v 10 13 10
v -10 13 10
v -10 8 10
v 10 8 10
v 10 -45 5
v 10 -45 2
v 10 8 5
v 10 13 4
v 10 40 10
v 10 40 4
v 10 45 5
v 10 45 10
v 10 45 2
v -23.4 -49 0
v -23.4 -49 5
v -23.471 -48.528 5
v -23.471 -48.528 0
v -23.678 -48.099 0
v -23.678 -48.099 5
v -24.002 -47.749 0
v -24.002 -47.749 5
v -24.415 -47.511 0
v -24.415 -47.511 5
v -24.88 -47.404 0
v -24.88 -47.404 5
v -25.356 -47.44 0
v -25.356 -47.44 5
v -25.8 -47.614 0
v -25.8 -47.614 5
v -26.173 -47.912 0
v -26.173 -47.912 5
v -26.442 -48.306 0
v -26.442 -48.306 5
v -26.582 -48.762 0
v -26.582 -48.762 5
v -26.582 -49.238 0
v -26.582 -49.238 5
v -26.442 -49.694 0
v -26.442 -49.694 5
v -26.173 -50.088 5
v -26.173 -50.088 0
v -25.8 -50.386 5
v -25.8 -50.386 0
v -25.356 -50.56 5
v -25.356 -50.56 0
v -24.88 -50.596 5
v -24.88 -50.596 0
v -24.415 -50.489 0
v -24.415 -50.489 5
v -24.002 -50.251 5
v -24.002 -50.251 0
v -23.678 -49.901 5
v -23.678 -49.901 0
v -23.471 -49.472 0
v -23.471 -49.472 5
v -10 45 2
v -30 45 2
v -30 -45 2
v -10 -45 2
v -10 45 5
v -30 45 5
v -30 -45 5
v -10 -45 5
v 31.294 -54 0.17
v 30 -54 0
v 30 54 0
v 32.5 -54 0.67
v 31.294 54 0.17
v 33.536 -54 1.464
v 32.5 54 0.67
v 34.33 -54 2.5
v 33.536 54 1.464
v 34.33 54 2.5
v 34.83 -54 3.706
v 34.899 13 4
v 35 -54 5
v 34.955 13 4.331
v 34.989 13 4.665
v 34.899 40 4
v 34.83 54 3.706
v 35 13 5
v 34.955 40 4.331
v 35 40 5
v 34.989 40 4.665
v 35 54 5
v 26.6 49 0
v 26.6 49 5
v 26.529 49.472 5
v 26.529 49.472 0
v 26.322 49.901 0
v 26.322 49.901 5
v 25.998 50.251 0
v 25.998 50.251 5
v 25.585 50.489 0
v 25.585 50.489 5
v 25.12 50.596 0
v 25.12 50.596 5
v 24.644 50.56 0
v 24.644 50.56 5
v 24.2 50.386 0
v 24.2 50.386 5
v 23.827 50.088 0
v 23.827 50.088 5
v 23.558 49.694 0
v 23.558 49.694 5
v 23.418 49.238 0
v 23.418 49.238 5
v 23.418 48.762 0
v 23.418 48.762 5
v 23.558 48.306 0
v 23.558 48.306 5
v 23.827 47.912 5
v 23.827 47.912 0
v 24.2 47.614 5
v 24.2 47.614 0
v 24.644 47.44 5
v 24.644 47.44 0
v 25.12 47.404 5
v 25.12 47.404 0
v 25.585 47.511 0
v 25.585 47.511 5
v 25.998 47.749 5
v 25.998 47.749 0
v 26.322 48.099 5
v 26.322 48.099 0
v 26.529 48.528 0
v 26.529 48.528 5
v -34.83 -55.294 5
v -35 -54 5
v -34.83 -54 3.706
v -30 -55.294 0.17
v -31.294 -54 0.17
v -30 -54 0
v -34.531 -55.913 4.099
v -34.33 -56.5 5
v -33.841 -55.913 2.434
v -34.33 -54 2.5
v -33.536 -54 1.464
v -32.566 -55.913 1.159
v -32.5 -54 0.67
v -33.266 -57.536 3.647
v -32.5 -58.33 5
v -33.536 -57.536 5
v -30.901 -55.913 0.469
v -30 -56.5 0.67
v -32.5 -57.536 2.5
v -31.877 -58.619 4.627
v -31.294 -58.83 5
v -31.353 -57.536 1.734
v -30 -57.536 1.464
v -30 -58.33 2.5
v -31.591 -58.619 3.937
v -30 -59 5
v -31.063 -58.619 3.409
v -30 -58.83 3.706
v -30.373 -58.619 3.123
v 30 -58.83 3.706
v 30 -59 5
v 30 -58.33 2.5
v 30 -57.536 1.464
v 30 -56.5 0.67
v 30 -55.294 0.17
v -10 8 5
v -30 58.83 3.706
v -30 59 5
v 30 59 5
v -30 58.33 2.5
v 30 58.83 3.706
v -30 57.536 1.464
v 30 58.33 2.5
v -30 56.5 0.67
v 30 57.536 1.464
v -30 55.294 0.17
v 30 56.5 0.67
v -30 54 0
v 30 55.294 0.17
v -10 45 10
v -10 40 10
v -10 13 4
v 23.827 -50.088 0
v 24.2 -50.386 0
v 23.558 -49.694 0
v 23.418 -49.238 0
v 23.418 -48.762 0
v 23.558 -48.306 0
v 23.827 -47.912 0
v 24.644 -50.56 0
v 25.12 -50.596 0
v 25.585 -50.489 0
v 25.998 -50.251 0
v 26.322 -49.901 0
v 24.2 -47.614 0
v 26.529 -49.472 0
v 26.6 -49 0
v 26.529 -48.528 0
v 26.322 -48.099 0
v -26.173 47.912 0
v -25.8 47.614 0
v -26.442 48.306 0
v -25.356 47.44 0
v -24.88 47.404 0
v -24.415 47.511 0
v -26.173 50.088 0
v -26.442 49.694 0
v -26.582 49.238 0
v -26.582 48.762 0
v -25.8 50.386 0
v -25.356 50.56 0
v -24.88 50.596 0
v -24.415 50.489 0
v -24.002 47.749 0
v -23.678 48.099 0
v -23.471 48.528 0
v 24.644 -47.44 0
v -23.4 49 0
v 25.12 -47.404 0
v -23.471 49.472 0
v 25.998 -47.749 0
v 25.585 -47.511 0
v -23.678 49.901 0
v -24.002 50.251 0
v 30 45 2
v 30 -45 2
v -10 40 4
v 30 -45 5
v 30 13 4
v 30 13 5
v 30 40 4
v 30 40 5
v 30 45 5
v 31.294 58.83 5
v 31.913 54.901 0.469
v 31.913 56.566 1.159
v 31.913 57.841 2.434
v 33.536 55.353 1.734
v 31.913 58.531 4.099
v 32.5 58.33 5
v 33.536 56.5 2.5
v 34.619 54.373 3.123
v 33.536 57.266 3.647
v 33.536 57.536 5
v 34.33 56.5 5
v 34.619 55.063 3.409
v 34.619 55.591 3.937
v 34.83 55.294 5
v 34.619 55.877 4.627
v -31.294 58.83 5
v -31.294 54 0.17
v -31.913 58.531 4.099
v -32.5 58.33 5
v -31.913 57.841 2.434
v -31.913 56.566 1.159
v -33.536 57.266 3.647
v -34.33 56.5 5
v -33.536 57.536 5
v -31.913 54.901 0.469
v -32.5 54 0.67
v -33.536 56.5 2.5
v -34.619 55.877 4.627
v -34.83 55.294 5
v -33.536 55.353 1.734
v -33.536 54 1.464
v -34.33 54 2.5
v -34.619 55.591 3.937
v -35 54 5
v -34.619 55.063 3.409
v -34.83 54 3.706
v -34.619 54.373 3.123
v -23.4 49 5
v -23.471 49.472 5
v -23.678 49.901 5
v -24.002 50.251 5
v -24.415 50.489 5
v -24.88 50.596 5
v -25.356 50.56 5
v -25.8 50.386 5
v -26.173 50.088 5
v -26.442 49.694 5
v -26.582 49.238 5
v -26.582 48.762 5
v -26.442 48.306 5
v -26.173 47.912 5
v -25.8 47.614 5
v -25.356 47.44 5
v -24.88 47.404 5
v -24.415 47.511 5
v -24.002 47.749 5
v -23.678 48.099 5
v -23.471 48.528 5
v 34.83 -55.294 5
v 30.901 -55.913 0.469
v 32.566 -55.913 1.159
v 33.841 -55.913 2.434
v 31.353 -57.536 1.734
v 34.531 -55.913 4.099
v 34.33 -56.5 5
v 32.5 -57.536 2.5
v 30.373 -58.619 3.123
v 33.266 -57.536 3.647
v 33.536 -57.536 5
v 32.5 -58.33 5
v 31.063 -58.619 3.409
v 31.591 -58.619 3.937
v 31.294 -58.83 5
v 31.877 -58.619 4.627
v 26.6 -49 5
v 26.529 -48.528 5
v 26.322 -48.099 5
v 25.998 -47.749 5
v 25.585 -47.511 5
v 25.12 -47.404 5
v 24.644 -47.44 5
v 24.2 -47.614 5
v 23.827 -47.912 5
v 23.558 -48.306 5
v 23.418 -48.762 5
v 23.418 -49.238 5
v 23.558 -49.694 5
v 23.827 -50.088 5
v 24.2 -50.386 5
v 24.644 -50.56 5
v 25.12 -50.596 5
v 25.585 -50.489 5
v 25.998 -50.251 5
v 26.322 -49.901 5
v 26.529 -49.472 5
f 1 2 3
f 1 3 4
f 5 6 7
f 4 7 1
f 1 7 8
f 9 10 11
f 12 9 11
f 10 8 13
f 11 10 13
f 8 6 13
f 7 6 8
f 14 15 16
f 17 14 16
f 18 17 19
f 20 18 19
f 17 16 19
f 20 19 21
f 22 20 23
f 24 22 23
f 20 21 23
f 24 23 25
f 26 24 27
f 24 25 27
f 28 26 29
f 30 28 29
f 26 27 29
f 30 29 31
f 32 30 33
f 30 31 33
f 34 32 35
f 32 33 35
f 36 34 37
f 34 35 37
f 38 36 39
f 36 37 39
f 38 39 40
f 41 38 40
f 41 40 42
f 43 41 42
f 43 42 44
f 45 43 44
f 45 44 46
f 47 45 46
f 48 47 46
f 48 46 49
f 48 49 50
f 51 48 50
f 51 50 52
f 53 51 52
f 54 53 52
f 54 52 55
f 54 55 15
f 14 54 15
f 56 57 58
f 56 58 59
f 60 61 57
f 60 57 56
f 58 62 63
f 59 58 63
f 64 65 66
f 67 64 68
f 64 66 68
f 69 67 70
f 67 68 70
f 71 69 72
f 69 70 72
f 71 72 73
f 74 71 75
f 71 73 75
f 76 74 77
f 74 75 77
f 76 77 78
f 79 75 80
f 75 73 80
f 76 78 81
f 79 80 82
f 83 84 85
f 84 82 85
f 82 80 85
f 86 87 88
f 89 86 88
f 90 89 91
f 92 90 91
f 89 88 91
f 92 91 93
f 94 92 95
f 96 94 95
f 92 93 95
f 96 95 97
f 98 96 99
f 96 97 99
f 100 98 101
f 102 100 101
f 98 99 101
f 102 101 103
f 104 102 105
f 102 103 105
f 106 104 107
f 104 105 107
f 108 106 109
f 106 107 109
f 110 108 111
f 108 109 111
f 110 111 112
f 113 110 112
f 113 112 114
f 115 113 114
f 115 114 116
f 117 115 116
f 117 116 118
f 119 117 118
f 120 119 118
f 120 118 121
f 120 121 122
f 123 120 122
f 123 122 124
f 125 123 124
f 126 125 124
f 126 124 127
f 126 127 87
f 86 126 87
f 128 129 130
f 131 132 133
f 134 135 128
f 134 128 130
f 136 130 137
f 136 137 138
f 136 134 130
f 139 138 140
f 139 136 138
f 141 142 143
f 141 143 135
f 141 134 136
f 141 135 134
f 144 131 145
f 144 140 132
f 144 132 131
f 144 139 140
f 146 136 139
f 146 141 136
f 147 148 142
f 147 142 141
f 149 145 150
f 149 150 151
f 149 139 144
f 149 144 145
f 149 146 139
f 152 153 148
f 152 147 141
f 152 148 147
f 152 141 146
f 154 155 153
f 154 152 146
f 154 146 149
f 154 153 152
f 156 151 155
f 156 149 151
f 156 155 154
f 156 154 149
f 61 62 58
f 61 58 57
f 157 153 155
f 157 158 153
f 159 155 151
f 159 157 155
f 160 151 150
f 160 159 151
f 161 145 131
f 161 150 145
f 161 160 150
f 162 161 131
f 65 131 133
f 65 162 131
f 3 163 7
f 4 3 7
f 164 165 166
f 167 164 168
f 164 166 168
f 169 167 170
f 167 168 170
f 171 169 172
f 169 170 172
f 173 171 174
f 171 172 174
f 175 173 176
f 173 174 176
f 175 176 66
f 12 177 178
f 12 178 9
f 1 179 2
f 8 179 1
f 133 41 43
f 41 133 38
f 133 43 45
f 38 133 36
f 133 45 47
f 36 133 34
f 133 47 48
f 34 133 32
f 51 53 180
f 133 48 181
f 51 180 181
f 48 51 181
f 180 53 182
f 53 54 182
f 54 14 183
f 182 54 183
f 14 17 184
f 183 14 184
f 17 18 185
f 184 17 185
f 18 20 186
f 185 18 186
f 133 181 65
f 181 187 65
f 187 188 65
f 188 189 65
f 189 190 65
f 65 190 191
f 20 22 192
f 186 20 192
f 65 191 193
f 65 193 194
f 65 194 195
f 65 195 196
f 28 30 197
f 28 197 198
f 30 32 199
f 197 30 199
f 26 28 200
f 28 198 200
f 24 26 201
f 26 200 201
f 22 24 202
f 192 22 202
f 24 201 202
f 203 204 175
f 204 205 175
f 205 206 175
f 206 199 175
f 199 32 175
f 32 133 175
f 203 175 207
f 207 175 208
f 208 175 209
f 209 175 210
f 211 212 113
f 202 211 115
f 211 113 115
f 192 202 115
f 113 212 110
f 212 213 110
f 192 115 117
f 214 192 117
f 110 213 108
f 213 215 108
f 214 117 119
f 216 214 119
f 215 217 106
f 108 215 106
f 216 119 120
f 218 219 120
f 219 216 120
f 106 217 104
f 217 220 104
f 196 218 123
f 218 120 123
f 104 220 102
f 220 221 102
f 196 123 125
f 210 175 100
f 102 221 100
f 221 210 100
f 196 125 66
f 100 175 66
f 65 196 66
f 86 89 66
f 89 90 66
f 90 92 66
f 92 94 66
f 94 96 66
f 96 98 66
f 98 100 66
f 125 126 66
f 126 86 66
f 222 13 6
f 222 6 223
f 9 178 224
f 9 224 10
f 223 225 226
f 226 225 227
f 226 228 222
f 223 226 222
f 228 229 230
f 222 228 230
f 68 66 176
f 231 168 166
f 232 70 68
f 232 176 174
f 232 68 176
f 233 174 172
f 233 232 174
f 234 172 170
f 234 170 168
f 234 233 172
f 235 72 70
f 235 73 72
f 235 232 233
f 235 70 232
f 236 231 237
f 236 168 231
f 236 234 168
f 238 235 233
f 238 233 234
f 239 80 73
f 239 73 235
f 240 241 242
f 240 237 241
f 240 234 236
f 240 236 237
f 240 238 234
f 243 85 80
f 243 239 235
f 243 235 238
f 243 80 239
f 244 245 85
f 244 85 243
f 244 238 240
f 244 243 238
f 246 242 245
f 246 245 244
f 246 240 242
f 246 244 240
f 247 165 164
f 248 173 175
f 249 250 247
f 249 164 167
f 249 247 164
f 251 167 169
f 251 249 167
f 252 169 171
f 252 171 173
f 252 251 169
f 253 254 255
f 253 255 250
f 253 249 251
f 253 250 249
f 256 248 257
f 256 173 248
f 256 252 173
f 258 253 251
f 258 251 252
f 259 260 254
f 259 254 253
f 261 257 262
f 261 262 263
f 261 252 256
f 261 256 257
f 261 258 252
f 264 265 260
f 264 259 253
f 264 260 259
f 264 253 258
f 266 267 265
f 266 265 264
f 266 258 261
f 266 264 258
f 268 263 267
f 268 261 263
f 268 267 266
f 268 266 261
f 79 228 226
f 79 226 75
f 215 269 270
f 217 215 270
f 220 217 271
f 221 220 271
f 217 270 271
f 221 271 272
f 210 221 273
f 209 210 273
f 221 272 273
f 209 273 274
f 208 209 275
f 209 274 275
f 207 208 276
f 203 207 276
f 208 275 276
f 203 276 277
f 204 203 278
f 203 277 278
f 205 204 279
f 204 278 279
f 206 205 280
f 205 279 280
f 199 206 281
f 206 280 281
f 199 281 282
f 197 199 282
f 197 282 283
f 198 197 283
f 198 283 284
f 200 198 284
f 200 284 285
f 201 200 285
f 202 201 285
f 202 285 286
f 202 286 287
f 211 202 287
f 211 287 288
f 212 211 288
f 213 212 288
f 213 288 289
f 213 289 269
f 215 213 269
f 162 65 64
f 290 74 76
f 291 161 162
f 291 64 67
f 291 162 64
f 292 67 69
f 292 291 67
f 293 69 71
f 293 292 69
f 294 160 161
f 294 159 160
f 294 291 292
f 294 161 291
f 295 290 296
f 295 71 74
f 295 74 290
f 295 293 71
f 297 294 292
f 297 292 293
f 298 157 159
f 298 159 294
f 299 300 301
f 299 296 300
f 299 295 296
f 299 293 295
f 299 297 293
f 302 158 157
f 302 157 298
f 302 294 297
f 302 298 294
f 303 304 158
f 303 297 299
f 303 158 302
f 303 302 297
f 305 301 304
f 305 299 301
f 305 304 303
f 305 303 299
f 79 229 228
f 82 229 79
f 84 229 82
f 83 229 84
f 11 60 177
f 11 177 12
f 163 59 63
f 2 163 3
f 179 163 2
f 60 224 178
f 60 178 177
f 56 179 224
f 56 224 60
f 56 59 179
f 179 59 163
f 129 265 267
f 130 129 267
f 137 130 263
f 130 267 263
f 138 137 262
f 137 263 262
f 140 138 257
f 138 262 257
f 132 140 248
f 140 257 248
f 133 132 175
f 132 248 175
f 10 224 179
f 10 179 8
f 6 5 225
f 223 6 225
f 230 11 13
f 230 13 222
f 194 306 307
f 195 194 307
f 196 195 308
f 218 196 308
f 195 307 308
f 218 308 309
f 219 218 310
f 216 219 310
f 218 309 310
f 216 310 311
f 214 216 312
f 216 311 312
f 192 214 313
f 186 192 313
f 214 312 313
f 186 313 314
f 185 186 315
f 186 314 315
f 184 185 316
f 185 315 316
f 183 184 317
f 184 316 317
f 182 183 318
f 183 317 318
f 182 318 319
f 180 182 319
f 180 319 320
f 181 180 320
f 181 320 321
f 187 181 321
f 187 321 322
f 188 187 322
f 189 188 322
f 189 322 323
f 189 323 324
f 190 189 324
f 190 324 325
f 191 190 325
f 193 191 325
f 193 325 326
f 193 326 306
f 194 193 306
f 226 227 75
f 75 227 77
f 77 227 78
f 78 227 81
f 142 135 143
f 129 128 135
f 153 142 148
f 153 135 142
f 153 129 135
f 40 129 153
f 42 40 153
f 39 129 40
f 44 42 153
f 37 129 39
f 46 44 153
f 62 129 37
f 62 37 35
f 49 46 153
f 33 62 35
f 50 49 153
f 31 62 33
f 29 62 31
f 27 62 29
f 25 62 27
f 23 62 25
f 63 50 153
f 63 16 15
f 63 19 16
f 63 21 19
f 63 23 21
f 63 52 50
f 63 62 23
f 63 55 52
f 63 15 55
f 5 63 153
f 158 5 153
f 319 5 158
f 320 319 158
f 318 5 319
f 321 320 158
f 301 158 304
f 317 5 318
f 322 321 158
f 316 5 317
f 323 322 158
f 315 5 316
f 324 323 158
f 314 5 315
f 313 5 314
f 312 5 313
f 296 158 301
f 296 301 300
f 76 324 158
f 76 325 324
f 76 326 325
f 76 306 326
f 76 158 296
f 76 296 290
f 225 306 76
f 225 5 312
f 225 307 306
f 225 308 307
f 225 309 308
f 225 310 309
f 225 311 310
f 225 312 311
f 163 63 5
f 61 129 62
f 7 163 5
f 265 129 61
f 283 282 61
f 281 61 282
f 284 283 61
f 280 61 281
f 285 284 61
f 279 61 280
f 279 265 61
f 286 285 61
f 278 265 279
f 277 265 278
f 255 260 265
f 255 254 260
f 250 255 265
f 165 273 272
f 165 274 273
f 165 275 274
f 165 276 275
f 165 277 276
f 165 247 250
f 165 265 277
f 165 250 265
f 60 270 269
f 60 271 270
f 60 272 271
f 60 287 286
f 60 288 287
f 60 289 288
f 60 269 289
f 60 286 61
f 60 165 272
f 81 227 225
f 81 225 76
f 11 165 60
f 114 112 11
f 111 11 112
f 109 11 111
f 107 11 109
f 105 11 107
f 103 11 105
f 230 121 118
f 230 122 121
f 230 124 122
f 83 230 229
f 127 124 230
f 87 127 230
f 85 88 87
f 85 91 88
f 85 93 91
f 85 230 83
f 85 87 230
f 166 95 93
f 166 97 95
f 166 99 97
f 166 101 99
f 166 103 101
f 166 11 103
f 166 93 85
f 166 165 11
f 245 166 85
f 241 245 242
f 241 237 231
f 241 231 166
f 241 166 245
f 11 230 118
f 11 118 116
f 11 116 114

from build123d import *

# Parameters (mm, degrees)
SKETCH_1_W          = 70
SKETCH_1_H          = 118
EXTRUDE_1_DEPTH     = 40
SKETCH_2_W          = 64
SKETCH_2_H          = 112
CUT_EXTRUDE_1_DEPTH = 35
SKETCH_3_R          = 1.6
CUT_EXTRUDE_2_DEPTH = 78.012985918
FILLET_1_R          = 5
FILLET_2_R          = 5
SKETCH_4_W          = 80
SKETCH_4_H          = 120
CUT_EXTRUDE_3_DEPTH = 35
SKETCH_5_W          = 60
SKETCH_5_H          = 27
CUT_EXTRUDE_4_DEPTH = 1
SKETCH_6_W          = 20
SKETCH_6_H          = 90
CUT_EXTRUDE_5_DEPTH = 3
SKETCH_7_W          = 20
SKETCH_7_H          = 90
CUT_EXTRUDE_6_DEPTH = 3
SKETCH_8_W          = 20
SKETCH_8_H          = 5
EXTRUDE_2_DEPTH     = 5


with BuildPart() as part:
    # ｽｹｯﾁ1 → ﾎﾞｽ - 押し出し1 (new body)
    with BuildSketch(Plane.XY):
        Rectangle(SKETCH_1_W, SKETCH_1_H)
    extrude(amount=EXTRUDE_1_DEPTH)

    # ｽｹｯﾁ2 → ｶｯﾄ - 押し出し1 (cut)
    with BuildSketch(Plane.XY.offset(40)):
        Rectangle(SKETCH_2_W, SKETCH_2_H)
    extrude(amount=-CUT_EXTRUDE_1_DEPTH, mode=Mode.SUBTRACT)

    # ｽｹｯﾁ3 → ｶｯﾄ - 押し出し2 (cut, through all)
    with BuildSketch(Plane.XY.offset(5)):
        with Locations((-25, 49)):
            Circle(SKETCH_3_R)
        with Locations((25, 49)):
            Circle(SKETCH_3_R)
        with Locations((-25, -49)):
            Circle(SKETCH_3_R)
        with Locations((25, -49)):
            Circle(SKETCH_3_R)
    extrude(amount=-CUT_EXTRUDE_2_DEPTH, mode=Mode.SUBTRACT)

    # ﾌｨﾚｯﾄ1
    fillet_1_edges = [part.edges().sort_by_distance(p)[0] for p in [
        (0, -59, 0),
        (-35, 0, 0),
        (0, 59, 0),
        (35, 0, 0),
    ]]
    fillet(fillet_1_edges, radius=FILLET_1_R)

    # ﾌｨﾚｯﾄ2
    # the kernel refuses this fillet: 5 mm, written as the material it takes off along each edge
    with BuildSketch(Plane(origin=(-30, 54, 5), x_dir=(0, 1, 0), z_dir=(-1, 0, 0))) as fillet_2_piece_1_section:
        Polygon((0, 0), (FILLET_2_R, 0), (FILLET_2_R, FILLET_2_R), (0, FILLET_2_R), align=None)
    fillet_2_piece_1 = extrude(amount=FILLET_2_R, mode=Mode.PRIVATE)
    fillet_2_piece_1 = fillet_2_piece_1 - Plane(origin=(-30, 54, 5), x_dir=(0, -0.7071067811865475, 0.7071067811865475), z_dir=(-1, 0, 0)) * Sphere(FILLET_2_R, mode=Mode.PRIVATE)
    add(fillet_2_piece_1, mode=Mode.SUBTRACT)
    with BuildSketch(Plane(origin=(30, 54, 5), x_dir=(0, 1, 0), z_dir=(1, 0, 0))) as fillet_2_piece_2_section:
        Polygon((0, 0), (FILLET_2_R, 0), (FILLET_2_R, -FILLET_2_R), (0, -FILLET_2_R), align=None)
    fillet_2_piece_2 = extrude(amount=FILLET_2_R, mode=Mode.PRIVATE)
    fillet_2_piece_2 = fillet_2_piece_2 - Plane(origin=(30, 54, 5), x_dir=(0, -0.7071067811865475, 0.7071067811865475), z_dir=(1, 0, 0)) * Sphere(FILLET_2_R, mode=Mode.PRIVATE)
    add(fillet_2_piece_2, mode=Mode.SUBTRACT)
    with BuildSketch(Plane(origin=(-30, -54, 5), x_dir=(-1, 0, 0), z_dir=(0, -1, 0))) as fillet_2_piece_3_section:
        Polygon((0, 0), (FILLET_2_R, 0), (FILLET_2_R, FILLET_2_R), (0, FILLET_2_R), align=None)
    fillet_2_piece_3 = extrude(amount=FILLET_2_R, mode=Mode.PRIVATE)
    fillet_2_piece_3 = fillet_2_piece_3 - Plane(origin=(-30, -54, 5), x_dir=(0.7071067811865475, 0, 0.7071067811865475), z_dir=(0, -1, 0)) * Sphere(FILLET_2_R, mode=Mode.PRIVATE)
    add(fillet_2_piece_3, mode=Mode.SUBTRACT)
    with BuildSketch(Plane(origin=(30, -54, 5), x_dir=(1, 0, 0), z_dir=(0, -1, 0))) as fillet_2_piece_4_section:
        Polygon((0, 0), (FILLET_2_R, 0), (FILLET_2_R, -FILLET_2_R), (0, -FILLET_2_R), align=None)
    fillet_2_piece_4 = extrude(amount=FILLET_2_R, mode=Mode.PRIVATE)
    fillet_2_piece_4 = fillet_2_piece_4 - Plane(origin=(30, -54, 5), x_dir=(-0.7071067811865475, 0, 0.7071067811865475), z_dir=(0, -1, 0)) * Sphere(FILLET_2_R, mode=Mode.PRIVATE)
    add(fillet_2_piece_4, mode=Mode.SUBTRACT)
    with BuildSketch(Plane(origin=(35, -59, 5), x_dir=(-1, 0, 0), z_dir=(0, 0, 1)), Plane(origin=(35, 59, 5), x_dir=(0, -1, 0), z_dir=(0, 0, 1))) as fillet_2_piece_5:
        with BuildLine():
            CenterArc((FILLET_2_R, -FILLET_2_R), FILLET_2_R, 90, 90)
            Line((0, -FILLET_2_R), (0, 0))
            Line((0, 0), (FILLET_2_R, 0))
        make_face()
    extrude(amount=47.5, mode=Mode.SUBTRACT)
    with BuildSketch(Plane(origin=(-35, -59, 5), x_dir=(1, 0, 0), z_dir=(0, 0, 1)), Plane(origin=(-35, 59, 5), x_dir=(0, -1, 0), z_dir=(0, 0, 1))) as fillet_2_piece_6:
        with BuildLine():
            CenterArc((FILLET_2_R, FILLET_2_R), FILLET_2_R, 180, 90)
            Line((0, FILLET_2_R), (0, 0))
            Line((0, 0), (FILLET_2_R, 0))
        make_face()
    extrude(amount=47.5, mode=Mode.SUBTRACT)

    # ｽｹｯﾁ4 → ｶｯﾄ - 押し出し3 (cut)
    with BuildSketch(Plane.XY.offset(40)):
        Rectangle(SKETCH_4_W, SKETCH_4_H)
    extrude(amount=-CUT_EXTRUDE_3_DEPTH, mode=Mode.SUBTRACT)

    # ｽｹｯﾁ5 → ｶｯﾄ - 押し出し4 (cut)
    with BuildSketch(Plane.XY.offset(5)):
        with Locations((5, 26.5)):
            Rectangle(SKETCH_5_W, SKETCH_5_H)
    extrude(amount=-CUT_EXTRUDE_4_DEPTH, mode=Mode.SUBTRACT)

    # ｽｹｯﾁ6 → ｶｯﾄ - 押し出し5 (cut)
    with BuildSketch(Plane.XY.offset(5)):
        with Locations((-20, 0)):
            Rectangle(SKETCH_6_W, SKETCH_6_H)
    extrude(amount=-CUT_EXTRUDE_5_DEPTH, mode=Mode.SUBTRACT)

    # ｽｹｯﾁ7 → ｶｯﾄ - 押し出し6 (cut)
    with BuildSketch(Plane.XY.offset(5)):
        with Locations((20, 0)):
            Rectangle(SKETCH_7_W, SKETCH_7_H)
    extrude(amount=-CUT_EXTRUDE_6_DEPTH, mode=Mode.SUBTRACT)

    # ｽｹｯﾁ8 → ﾎﾞｽ - 押し出し2 (add)
    with BuildSketch(Plane.XY.offset(5)):
        with Locations((0, 10.5)):
            Rectangle(SKETCH_8_W, SKETCH_8_H)
        with Locations((0, 42.5)):
            Rectangle(SKETCH_8_W, SKETCH_8_H)
    extrude(amount=EXTRUDE_2_DEPTH)


solid = part.part
